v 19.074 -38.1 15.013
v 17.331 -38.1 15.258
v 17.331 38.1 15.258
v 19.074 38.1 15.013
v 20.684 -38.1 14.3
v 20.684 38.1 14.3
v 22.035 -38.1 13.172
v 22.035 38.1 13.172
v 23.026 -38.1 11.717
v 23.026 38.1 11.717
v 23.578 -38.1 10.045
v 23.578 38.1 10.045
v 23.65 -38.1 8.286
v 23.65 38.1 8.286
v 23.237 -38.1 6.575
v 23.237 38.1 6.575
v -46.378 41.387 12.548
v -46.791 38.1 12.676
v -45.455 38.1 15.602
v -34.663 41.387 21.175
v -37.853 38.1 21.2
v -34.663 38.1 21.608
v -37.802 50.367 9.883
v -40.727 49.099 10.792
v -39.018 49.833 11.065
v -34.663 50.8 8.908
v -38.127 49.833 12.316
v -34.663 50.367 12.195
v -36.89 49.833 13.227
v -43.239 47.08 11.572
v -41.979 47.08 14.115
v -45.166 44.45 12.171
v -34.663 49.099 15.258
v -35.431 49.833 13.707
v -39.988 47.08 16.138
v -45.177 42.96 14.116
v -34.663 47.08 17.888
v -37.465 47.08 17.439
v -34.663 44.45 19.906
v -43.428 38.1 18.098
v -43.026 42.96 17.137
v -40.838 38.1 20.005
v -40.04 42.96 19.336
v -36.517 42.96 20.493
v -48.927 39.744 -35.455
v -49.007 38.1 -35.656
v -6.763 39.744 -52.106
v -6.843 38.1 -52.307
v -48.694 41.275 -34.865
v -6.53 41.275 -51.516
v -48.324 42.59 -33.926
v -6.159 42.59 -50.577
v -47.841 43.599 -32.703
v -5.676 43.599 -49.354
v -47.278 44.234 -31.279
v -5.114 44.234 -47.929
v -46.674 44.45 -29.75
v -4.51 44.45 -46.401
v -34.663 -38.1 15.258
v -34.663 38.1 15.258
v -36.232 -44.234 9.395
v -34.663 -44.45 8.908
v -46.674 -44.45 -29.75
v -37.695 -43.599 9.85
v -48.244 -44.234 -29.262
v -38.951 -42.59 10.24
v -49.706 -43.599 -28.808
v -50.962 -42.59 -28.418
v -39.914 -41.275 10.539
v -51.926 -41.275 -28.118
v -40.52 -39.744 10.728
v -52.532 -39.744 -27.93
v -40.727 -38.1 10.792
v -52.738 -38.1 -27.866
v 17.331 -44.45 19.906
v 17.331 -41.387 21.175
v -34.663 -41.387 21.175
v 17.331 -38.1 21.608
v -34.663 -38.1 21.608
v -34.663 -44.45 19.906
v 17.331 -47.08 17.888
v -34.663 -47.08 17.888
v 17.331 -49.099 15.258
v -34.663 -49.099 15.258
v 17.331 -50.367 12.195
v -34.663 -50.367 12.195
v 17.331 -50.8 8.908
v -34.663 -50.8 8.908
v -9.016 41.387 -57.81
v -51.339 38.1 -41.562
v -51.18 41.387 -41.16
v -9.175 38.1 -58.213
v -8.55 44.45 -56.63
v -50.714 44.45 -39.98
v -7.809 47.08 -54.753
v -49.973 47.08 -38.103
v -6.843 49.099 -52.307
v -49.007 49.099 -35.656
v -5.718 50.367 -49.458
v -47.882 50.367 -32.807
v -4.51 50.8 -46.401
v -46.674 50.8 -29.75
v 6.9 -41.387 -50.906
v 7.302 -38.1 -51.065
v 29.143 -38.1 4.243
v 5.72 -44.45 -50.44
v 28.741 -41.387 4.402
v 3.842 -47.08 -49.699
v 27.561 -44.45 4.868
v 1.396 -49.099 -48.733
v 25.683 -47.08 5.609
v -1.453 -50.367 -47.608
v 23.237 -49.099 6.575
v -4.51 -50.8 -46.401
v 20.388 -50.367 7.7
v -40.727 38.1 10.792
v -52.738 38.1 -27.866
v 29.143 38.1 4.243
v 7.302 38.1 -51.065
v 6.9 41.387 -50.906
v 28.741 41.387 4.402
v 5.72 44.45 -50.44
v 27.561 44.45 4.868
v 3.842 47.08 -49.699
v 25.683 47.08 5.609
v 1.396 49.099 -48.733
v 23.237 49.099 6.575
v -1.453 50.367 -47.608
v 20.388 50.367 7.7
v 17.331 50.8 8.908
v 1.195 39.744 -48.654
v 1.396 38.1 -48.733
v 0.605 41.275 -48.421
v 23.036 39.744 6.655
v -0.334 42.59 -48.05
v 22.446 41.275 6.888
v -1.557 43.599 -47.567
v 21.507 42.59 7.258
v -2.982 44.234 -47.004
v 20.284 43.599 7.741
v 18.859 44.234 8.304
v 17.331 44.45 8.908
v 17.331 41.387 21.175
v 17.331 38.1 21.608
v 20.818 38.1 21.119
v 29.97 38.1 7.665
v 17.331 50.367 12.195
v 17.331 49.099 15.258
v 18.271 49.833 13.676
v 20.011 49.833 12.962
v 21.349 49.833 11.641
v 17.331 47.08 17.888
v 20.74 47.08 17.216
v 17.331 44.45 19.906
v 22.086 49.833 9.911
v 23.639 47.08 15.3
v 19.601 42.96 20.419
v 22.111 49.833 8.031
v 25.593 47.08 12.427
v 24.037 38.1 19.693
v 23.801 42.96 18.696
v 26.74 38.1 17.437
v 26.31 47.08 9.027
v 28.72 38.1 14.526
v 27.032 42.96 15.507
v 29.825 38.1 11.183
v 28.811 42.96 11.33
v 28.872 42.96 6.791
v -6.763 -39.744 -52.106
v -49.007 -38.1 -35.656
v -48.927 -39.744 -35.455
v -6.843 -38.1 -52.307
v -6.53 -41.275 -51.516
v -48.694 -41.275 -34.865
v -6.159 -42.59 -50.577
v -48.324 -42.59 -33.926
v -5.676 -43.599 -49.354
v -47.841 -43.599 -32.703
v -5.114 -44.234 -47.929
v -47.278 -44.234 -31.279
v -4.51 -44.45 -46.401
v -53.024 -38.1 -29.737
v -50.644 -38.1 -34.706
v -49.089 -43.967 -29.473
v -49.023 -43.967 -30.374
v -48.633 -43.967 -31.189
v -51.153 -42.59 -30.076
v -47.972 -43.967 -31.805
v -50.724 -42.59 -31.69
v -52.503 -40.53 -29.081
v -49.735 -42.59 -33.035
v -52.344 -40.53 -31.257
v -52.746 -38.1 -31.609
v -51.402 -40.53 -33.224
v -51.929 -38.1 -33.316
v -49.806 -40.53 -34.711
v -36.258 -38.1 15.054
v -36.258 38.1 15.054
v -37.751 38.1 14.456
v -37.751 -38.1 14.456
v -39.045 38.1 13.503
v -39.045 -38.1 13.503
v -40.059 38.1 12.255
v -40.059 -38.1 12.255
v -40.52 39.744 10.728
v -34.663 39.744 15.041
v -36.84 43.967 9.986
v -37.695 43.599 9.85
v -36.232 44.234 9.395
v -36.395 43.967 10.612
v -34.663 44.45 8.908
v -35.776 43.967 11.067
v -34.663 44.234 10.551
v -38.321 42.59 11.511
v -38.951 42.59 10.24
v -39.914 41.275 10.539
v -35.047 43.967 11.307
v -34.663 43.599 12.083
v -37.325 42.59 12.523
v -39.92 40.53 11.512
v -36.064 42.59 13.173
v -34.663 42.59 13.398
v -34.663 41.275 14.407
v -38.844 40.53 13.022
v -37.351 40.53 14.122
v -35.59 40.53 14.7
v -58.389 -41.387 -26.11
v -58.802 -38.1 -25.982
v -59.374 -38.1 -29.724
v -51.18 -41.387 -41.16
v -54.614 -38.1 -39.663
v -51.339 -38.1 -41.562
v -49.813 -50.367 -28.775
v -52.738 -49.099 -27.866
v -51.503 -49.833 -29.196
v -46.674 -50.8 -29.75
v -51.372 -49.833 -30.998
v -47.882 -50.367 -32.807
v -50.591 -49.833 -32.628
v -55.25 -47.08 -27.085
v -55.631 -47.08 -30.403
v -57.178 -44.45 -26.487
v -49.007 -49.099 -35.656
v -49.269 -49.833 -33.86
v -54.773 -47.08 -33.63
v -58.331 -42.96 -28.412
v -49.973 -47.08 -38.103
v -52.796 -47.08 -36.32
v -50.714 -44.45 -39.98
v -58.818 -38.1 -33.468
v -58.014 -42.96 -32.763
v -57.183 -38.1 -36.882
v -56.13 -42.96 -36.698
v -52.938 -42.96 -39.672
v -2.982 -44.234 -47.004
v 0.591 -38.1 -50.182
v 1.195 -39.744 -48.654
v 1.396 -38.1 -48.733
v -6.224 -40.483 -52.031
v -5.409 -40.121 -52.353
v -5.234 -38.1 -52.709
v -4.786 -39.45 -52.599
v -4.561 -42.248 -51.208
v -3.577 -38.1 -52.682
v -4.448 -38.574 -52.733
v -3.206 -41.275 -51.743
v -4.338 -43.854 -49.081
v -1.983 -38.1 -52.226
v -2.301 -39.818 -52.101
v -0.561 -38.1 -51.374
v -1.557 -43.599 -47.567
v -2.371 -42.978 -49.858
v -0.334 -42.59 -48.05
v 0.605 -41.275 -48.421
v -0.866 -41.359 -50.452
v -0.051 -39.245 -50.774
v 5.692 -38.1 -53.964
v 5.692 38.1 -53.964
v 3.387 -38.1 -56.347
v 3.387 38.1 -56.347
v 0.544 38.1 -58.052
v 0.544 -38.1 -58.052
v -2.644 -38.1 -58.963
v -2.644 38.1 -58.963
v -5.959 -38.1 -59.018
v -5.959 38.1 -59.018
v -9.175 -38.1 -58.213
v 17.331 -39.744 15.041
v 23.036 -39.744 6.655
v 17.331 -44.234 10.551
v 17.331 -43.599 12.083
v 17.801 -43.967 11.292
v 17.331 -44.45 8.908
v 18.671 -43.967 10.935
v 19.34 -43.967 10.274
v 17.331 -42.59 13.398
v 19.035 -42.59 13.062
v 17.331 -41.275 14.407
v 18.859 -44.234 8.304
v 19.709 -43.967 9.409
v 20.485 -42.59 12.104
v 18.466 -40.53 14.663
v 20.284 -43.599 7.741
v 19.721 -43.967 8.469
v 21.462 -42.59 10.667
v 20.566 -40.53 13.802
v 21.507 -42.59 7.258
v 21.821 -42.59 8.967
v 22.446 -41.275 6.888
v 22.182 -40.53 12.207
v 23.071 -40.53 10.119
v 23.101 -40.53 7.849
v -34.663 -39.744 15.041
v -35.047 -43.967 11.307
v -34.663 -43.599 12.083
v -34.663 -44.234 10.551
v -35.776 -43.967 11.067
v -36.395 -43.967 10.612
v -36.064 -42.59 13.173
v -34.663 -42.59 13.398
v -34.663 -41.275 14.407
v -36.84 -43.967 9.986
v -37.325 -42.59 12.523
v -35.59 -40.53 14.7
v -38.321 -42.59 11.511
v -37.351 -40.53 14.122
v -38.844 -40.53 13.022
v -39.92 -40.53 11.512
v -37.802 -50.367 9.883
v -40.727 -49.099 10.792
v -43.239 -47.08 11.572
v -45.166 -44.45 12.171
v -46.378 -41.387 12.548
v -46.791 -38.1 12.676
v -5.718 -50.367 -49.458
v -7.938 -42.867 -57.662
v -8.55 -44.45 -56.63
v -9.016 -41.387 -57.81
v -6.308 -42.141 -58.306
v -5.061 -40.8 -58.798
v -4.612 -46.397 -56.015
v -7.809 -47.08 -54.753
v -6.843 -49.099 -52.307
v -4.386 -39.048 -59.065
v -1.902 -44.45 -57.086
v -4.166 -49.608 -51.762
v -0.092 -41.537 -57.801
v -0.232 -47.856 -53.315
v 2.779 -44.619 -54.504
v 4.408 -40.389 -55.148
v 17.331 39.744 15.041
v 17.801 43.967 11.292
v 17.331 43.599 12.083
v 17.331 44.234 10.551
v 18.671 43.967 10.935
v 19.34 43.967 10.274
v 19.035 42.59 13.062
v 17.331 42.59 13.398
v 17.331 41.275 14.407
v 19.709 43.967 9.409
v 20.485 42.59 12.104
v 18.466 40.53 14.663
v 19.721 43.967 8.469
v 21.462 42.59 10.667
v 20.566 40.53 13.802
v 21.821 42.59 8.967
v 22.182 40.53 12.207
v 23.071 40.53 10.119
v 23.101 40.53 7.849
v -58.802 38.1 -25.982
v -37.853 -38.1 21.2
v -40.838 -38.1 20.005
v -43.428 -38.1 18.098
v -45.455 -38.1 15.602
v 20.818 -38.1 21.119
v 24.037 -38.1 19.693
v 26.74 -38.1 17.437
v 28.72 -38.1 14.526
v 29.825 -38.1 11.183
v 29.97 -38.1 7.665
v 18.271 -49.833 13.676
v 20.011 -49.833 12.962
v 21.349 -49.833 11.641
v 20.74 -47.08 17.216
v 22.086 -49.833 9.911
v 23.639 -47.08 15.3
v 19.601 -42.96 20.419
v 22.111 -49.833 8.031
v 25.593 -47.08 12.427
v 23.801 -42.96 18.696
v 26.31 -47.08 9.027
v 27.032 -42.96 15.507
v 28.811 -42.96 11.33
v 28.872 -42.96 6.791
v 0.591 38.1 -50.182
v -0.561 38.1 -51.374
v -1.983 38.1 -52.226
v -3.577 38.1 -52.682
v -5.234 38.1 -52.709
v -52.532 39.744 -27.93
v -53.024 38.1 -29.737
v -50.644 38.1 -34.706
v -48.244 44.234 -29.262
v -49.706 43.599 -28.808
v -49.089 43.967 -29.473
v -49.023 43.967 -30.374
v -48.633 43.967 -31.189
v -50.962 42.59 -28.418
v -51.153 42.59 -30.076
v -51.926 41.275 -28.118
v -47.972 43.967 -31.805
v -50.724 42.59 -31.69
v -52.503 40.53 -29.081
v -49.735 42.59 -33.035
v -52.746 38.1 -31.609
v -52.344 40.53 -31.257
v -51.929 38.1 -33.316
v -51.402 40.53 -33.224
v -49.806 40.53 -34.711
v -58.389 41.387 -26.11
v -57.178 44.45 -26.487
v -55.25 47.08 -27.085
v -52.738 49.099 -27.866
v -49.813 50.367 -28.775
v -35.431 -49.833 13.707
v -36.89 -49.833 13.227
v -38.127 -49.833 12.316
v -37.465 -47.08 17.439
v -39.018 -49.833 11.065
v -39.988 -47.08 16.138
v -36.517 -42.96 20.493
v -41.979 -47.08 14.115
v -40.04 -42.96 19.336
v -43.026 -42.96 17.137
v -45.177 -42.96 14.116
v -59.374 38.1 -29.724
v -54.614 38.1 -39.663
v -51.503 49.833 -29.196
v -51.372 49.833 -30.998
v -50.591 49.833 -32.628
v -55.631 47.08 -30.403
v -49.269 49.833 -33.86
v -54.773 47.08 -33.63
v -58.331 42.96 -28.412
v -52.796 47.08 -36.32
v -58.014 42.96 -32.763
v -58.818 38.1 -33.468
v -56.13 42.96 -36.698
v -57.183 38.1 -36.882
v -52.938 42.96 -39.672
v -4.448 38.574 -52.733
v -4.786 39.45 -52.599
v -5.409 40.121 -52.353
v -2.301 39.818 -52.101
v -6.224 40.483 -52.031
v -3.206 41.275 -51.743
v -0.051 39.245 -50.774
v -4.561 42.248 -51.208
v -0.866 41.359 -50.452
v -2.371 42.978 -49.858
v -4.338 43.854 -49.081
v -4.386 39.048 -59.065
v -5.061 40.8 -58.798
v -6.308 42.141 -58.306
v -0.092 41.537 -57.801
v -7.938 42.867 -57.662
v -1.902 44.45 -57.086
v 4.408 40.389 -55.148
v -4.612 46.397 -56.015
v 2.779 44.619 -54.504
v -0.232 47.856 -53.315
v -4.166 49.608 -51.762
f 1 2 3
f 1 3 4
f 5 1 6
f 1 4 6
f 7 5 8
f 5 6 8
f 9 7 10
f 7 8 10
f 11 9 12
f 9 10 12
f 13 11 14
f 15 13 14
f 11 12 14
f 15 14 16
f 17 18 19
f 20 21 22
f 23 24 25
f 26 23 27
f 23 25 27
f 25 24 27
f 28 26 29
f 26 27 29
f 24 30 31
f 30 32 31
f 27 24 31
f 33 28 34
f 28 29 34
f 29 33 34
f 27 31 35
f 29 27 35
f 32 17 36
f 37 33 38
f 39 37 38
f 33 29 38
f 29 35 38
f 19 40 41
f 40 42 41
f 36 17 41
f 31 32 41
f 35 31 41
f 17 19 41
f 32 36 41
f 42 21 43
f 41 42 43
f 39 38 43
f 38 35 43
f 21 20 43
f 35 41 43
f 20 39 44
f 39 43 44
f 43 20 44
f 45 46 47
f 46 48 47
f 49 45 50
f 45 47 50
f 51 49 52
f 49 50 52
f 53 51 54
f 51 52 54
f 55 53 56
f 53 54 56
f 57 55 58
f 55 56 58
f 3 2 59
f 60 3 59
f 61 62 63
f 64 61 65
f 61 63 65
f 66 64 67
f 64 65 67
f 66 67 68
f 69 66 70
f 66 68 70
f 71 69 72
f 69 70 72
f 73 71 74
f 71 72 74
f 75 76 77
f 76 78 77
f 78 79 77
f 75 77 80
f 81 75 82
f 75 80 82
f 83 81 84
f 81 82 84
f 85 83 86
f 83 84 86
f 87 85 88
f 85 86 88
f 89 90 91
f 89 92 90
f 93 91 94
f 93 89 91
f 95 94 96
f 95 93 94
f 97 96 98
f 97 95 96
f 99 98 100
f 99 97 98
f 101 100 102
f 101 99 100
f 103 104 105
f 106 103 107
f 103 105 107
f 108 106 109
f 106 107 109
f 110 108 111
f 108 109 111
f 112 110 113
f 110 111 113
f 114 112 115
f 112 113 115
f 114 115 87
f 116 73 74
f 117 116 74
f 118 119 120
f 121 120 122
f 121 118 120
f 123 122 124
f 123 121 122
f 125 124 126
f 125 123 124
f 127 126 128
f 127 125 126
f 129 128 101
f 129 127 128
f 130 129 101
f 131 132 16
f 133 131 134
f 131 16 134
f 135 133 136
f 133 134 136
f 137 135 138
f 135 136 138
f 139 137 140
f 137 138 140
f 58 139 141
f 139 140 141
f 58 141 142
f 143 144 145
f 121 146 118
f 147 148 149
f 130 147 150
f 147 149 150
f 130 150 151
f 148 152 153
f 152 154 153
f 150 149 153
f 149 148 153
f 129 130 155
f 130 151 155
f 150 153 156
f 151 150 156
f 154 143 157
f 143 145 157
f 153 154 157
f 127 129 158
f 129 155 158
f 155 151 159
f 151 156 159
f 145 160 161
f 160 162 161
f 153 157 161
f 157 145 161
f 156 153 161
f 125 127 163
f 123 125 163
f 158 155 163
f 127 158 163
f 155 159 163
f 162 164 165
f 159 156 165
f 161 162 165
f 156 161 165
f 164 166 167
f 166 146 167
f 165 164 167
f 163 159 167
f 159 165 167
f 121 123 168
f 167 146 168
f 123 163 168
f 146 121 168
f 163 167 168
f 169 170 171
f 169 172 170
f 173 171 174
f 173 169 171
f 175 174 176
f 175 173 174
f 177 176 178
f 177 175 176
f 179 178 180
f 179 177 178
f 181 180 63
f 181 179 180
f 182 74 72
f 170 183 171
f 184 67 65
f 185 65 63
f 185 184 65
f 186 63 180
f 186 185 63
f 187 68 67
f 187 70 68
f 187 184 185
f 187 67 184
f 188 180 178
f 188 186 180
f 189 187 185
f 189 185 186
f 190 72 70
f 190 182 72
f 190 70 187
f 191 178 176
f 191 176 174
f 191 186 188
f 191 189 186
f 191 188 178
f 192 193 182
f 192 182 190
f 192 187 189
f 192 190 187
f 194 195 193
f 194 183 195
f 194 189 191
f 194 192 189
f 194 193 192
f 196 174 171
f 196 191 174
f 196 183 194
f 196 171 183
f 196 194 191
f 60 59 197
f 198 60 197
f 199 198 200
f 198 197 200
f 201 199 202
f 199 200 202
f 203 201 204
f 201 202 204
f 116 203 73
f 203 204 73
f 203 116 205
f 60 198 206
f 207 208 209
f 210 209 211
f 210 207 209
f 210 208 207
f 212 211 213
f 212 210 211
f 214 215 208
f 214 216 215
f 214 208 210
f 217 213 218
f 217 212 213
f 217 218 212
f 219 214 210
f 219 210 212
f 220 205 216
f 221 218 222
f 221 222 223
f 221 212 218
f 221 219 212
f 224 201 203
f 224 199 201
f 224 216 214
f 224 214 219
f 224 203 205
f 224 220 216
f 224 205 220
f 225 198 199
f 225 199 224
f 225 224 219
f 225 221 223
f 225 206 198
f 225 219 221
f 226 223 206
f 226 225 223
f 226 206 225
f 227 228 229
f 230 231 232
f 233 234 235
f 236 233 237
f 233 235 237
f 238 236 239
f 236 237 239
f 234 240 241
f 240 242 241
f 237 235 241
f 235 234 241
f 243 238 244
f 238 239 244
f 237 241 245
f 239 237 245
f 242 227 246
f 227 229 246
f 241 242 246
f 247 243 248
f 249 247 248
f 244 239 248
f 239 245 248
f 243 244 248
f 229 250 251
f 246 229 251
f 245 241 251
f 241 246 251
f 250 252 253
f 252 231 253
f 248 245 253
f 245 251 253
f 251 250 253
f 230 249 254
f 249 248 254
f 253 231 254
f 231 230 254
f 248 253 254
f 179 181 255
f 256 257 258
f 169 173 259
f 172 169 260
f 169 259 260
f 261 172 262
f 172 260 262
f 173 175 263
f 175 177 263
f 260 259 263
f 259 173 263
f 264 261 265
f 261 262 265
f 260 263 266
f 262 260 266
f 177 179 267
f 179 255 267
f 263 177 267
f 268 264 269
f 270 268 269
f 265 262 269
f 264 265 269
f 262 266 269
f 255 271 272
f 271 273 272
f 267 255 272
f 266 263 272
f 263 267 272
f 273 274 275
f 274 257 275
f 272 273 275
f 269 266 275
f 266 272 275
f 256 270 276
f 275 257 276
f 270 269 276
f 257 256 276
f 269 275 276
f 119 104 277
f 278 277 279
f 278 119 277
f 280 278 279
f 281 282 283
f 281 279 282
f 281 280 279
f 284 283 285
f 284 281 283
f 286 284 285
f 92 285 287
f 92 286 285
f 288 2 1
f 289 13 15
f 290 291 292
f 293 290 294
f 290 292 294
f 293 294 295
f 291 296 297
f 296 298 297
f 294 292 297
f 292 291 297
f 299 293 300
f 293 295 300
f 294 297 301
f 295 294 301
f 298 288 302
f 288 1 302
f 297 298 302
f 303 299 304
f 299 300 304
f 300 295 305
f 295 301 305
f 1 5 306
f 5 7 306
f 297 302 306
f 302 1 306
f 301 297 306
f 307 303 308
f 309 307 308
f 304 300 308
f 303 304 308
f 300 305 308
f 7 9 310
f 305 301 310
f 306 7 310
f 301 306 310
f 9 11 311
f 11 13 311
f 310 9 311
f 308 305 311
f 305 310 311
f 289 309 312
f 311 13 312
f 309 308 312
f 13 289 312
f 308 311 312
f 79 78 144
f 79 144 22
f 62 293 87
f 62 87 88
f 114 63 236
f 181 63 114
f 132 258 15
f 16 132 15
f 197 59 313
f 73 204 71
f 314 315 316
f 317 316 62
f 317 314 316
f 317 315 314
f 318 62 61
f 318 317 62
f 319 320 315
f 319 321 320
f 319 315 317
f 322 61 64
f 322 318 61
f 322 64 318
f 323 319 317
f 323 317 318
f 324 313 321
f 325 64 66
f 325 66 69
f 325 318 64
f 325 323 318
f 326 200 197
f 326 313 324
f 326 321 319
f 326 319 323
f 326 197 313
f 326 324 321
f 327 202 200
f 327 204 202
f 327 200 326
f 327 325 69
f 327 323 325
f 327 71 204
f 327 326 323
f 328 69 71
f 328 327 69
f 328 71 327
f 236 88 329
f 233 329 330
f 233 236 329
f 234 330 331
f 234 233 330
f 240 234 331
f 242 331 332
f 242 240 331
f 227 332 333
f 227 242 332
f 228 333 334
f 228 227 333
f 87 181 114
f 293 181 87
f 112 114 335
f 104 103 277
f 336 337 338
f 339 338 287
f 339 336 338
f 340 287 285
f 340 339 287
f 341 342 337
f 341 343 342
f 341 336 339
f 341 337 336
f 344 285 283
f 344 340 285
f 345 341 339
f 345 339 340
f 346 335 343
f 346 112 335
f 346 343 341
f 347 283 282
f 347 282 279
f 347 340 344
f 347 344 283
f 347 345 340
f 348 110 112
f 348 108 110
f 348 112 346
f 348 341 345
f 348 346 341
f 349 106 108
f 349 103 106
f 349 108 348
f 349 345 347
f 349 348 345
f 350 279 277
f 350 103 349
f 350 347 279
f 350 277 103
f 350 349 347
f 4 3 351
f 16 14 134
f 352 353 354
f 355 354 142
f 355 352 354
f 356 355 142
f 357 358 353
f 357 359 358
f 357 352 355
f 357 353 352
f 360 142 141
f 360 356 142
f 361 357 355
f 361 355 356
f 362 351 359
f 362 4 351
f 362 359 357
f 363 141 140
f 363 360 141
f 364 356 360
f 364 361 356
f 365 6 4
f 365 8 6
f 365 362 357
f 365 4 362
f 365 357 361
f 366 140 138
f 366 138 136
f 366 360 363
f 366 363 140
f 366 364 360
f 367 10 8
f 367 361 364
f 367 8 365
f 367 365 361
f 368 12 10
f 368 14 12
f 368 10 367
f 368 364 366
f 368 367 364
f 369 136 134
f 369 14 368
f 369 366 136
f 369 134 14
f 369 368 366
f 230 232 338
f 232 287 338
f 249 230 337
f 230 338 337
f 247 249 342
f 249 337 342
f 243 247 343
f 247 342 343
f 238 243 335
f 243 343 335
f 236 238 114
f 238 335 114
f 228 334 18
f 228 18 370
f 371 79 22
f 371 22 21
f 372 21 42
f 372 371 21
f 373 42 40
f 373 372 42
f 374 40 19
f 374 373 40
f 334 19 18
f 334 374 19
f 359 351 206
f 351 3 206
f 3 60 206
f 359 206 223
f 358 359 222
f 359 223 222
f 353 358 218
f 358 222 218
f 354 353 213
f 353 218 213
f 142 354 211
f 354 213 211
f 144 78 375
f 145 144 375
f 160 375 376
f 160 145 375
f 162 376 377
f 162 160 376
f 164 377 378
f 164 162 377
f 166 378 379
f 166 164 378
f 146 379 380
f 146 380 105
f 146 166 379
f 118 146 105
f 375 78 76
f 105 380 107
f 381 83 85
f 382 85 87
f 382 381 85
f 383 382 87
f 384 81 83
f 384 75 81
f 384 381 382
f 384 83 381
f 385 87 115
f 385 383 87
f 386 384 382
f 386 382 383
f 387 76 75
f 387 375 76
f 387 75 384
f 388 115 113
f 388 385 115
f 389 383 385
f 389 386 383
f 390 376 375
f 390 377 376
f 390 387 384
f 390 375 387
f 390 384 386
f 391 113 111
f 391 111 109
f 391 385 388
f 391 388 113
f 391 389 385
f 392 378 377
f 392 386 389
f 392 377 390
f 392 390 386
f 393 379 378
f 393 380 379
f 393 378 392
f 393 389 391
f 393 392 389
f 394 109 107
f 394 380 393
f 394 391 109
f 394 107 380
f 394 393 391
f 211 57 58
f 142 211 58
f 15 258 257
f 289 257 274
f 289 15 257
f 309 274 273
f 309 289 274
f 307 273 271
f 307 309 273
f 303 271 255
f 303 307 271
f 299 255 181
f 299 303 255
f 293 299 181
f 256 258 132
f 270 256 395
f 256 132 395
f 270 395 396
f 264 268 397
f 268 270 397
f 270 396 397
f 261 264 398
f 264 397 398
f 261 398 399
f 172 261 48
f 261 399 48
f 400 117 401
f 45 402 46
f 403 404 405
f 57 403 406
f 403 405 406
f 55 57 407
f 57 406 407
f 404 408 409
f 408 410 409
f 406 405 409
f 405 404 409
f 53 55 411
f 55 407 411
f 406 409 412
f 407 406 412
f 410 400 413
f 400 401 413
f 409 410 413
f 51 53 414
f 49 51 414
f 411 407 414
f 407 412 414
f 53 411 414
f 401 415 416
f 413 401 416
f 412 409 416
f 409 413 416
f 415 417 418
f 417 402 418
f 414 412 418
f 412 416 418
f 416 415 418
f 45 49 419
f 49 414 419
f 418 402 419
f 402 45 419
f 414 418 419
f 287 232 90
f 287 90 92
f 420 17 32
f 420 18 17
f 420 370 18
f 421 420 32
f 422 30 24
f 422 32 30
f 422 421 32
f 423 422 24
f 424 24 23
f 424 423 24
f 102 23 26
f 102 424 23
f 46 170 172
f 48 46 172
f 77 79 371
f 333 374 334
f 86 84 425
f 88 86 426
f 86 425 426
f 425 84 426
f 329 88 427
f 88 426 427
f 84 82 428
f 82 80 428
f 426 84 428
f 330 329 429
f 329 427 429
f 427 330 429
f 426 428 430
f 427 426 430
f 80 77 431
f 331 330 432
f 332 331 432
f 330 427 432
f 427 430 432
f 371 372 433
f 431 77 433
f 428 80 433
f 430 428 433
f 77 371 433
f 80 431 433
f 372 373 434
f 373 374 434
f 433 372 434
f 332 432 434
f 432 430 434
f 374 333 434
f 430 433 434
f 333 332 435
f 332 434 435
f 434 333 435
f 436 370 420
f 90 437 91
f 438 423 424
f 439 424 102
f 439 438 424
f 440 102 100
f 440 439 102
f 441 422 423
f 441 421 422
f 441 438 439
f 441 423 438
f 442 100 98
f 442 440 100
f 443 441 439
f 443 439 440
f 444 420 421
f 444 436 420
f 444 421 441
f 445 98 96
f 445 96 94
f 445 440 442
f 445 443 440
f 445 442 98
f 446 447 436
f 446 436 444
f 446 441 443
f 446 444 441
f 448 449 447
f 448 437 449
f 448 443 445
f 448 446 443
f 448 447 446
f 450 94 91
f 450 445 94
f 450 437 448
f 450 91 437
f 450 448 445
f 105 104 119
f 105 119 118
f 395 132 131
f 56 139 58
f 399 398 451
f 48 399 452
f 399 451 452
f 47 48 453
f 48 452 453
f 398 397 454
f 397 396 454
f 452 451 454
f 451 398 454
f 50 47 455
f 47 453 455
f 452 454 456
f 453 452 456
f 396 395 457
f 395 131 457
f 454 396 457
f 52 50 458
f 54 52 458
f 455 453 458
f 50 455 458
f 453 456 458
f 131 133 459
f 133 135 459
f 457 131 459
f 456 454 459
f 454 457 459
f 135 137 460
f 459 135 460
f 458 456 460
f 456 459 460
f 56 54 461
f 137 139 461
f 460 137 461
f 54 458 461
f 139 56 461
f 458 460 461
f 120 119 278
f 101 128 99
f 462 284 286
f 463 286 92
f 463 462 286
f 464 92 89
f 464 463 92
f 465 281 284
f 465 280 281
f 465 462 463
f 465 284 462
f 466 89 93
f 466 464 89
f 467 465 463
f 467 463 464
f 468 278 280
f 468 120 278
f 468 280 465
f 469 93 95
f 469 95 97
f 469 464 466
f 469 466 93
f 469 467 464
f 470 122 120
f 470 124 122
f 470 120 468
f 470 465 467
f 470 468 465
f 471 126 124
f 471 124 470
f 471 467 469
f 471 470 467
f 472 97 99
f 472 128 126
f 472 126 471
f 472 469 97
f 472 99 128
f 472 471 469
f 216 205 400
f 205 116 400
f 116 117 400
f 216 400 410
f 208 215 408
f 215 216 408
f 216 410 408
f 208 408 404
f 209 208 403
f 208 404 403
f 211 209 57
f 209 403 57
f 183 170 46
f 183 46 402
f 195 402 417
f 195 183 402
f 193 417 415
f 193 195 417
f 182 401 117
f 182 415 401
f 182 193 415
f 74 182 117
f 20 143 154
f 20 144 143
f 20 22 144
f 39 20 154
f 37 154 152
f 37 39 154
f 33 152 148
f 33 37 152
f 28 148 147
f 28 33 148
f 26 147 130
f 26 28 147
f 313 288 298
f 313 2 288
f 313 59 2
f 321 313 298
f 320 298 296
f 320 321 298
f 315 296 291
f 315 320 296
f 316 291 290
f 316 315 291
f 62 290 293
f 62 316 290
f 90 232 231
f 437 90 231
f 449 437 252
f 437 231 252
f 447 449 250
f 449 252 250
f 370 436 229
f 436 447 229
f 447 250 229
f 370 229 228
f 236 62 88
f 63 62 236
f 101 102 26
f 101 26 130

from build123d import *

# Parameters (mm, degrees)
F1_DEPTH = 50.8
F2_R     = 12.7
F3_T     = -6.35


# Not quite as in the source:
# - a shell that OpenCascade refuses in one call is made with other operations: the cavity is built on its own and cut out


with BuildPart() as f1:
    # F0 (on Front) → F1 (new body, symmetric)
    with BuildSketch(Plane.XZ):
        Polygon((36.0003995515, 21.6075032949), (-44.0155640244, 21.6075032949), (-62.2989119761, -37.2344391203), (2.6374720037, -62.877625227), align=None)
    extrude(amount=F1_DEPTH, both=True)

    # F2
    f2_edges = [f1.edges().sort_by_distance(p)[0] for p in [
        (36.0004, 0, 21.607503),
        (-4.007582, 50.8, 21.607503),
        (-44.015564, 0, 21.607503),
        (-4.007582, -50.8, 21.607503),
        (19.318936, -50.8, -20.635061),
        (-53.157238, -50.8, -7.813468),
        (-29.83072, -50.8, -50.056032),
        (19.318936, 50.8, -20.635061),
        (2.637472, 0, -62.877625),
        (-53.157238, 50.8, -7.813468),
        (-29.83072, 50.8, -50.056032),
        (-62.298912, 0, -37.234439),
    ]]
    fillet(f2_edges, radius=F2_R)

    # F3: a shell. OpenCascade refuses it in one call, so the cavity is built on its own and cut out:
    # the body offset inwards by the wall thickness, plus a prism from it out through each open face.
    f3_core = offset(f1.part, amount=F3_T, mode=Mode.PRIVATE)
    f3_exits = [f3_core.faces().sort_by_distance(p)[0] for p in [
        (-15.577686, -44.45, -14.539718),
    ]]
    add(f3_core, mode=Mode.SUBTRACT)
    extrude(f3_exits, amount=-F3_T, mode=Mode.SUBTRACT)


solid = f1.part
